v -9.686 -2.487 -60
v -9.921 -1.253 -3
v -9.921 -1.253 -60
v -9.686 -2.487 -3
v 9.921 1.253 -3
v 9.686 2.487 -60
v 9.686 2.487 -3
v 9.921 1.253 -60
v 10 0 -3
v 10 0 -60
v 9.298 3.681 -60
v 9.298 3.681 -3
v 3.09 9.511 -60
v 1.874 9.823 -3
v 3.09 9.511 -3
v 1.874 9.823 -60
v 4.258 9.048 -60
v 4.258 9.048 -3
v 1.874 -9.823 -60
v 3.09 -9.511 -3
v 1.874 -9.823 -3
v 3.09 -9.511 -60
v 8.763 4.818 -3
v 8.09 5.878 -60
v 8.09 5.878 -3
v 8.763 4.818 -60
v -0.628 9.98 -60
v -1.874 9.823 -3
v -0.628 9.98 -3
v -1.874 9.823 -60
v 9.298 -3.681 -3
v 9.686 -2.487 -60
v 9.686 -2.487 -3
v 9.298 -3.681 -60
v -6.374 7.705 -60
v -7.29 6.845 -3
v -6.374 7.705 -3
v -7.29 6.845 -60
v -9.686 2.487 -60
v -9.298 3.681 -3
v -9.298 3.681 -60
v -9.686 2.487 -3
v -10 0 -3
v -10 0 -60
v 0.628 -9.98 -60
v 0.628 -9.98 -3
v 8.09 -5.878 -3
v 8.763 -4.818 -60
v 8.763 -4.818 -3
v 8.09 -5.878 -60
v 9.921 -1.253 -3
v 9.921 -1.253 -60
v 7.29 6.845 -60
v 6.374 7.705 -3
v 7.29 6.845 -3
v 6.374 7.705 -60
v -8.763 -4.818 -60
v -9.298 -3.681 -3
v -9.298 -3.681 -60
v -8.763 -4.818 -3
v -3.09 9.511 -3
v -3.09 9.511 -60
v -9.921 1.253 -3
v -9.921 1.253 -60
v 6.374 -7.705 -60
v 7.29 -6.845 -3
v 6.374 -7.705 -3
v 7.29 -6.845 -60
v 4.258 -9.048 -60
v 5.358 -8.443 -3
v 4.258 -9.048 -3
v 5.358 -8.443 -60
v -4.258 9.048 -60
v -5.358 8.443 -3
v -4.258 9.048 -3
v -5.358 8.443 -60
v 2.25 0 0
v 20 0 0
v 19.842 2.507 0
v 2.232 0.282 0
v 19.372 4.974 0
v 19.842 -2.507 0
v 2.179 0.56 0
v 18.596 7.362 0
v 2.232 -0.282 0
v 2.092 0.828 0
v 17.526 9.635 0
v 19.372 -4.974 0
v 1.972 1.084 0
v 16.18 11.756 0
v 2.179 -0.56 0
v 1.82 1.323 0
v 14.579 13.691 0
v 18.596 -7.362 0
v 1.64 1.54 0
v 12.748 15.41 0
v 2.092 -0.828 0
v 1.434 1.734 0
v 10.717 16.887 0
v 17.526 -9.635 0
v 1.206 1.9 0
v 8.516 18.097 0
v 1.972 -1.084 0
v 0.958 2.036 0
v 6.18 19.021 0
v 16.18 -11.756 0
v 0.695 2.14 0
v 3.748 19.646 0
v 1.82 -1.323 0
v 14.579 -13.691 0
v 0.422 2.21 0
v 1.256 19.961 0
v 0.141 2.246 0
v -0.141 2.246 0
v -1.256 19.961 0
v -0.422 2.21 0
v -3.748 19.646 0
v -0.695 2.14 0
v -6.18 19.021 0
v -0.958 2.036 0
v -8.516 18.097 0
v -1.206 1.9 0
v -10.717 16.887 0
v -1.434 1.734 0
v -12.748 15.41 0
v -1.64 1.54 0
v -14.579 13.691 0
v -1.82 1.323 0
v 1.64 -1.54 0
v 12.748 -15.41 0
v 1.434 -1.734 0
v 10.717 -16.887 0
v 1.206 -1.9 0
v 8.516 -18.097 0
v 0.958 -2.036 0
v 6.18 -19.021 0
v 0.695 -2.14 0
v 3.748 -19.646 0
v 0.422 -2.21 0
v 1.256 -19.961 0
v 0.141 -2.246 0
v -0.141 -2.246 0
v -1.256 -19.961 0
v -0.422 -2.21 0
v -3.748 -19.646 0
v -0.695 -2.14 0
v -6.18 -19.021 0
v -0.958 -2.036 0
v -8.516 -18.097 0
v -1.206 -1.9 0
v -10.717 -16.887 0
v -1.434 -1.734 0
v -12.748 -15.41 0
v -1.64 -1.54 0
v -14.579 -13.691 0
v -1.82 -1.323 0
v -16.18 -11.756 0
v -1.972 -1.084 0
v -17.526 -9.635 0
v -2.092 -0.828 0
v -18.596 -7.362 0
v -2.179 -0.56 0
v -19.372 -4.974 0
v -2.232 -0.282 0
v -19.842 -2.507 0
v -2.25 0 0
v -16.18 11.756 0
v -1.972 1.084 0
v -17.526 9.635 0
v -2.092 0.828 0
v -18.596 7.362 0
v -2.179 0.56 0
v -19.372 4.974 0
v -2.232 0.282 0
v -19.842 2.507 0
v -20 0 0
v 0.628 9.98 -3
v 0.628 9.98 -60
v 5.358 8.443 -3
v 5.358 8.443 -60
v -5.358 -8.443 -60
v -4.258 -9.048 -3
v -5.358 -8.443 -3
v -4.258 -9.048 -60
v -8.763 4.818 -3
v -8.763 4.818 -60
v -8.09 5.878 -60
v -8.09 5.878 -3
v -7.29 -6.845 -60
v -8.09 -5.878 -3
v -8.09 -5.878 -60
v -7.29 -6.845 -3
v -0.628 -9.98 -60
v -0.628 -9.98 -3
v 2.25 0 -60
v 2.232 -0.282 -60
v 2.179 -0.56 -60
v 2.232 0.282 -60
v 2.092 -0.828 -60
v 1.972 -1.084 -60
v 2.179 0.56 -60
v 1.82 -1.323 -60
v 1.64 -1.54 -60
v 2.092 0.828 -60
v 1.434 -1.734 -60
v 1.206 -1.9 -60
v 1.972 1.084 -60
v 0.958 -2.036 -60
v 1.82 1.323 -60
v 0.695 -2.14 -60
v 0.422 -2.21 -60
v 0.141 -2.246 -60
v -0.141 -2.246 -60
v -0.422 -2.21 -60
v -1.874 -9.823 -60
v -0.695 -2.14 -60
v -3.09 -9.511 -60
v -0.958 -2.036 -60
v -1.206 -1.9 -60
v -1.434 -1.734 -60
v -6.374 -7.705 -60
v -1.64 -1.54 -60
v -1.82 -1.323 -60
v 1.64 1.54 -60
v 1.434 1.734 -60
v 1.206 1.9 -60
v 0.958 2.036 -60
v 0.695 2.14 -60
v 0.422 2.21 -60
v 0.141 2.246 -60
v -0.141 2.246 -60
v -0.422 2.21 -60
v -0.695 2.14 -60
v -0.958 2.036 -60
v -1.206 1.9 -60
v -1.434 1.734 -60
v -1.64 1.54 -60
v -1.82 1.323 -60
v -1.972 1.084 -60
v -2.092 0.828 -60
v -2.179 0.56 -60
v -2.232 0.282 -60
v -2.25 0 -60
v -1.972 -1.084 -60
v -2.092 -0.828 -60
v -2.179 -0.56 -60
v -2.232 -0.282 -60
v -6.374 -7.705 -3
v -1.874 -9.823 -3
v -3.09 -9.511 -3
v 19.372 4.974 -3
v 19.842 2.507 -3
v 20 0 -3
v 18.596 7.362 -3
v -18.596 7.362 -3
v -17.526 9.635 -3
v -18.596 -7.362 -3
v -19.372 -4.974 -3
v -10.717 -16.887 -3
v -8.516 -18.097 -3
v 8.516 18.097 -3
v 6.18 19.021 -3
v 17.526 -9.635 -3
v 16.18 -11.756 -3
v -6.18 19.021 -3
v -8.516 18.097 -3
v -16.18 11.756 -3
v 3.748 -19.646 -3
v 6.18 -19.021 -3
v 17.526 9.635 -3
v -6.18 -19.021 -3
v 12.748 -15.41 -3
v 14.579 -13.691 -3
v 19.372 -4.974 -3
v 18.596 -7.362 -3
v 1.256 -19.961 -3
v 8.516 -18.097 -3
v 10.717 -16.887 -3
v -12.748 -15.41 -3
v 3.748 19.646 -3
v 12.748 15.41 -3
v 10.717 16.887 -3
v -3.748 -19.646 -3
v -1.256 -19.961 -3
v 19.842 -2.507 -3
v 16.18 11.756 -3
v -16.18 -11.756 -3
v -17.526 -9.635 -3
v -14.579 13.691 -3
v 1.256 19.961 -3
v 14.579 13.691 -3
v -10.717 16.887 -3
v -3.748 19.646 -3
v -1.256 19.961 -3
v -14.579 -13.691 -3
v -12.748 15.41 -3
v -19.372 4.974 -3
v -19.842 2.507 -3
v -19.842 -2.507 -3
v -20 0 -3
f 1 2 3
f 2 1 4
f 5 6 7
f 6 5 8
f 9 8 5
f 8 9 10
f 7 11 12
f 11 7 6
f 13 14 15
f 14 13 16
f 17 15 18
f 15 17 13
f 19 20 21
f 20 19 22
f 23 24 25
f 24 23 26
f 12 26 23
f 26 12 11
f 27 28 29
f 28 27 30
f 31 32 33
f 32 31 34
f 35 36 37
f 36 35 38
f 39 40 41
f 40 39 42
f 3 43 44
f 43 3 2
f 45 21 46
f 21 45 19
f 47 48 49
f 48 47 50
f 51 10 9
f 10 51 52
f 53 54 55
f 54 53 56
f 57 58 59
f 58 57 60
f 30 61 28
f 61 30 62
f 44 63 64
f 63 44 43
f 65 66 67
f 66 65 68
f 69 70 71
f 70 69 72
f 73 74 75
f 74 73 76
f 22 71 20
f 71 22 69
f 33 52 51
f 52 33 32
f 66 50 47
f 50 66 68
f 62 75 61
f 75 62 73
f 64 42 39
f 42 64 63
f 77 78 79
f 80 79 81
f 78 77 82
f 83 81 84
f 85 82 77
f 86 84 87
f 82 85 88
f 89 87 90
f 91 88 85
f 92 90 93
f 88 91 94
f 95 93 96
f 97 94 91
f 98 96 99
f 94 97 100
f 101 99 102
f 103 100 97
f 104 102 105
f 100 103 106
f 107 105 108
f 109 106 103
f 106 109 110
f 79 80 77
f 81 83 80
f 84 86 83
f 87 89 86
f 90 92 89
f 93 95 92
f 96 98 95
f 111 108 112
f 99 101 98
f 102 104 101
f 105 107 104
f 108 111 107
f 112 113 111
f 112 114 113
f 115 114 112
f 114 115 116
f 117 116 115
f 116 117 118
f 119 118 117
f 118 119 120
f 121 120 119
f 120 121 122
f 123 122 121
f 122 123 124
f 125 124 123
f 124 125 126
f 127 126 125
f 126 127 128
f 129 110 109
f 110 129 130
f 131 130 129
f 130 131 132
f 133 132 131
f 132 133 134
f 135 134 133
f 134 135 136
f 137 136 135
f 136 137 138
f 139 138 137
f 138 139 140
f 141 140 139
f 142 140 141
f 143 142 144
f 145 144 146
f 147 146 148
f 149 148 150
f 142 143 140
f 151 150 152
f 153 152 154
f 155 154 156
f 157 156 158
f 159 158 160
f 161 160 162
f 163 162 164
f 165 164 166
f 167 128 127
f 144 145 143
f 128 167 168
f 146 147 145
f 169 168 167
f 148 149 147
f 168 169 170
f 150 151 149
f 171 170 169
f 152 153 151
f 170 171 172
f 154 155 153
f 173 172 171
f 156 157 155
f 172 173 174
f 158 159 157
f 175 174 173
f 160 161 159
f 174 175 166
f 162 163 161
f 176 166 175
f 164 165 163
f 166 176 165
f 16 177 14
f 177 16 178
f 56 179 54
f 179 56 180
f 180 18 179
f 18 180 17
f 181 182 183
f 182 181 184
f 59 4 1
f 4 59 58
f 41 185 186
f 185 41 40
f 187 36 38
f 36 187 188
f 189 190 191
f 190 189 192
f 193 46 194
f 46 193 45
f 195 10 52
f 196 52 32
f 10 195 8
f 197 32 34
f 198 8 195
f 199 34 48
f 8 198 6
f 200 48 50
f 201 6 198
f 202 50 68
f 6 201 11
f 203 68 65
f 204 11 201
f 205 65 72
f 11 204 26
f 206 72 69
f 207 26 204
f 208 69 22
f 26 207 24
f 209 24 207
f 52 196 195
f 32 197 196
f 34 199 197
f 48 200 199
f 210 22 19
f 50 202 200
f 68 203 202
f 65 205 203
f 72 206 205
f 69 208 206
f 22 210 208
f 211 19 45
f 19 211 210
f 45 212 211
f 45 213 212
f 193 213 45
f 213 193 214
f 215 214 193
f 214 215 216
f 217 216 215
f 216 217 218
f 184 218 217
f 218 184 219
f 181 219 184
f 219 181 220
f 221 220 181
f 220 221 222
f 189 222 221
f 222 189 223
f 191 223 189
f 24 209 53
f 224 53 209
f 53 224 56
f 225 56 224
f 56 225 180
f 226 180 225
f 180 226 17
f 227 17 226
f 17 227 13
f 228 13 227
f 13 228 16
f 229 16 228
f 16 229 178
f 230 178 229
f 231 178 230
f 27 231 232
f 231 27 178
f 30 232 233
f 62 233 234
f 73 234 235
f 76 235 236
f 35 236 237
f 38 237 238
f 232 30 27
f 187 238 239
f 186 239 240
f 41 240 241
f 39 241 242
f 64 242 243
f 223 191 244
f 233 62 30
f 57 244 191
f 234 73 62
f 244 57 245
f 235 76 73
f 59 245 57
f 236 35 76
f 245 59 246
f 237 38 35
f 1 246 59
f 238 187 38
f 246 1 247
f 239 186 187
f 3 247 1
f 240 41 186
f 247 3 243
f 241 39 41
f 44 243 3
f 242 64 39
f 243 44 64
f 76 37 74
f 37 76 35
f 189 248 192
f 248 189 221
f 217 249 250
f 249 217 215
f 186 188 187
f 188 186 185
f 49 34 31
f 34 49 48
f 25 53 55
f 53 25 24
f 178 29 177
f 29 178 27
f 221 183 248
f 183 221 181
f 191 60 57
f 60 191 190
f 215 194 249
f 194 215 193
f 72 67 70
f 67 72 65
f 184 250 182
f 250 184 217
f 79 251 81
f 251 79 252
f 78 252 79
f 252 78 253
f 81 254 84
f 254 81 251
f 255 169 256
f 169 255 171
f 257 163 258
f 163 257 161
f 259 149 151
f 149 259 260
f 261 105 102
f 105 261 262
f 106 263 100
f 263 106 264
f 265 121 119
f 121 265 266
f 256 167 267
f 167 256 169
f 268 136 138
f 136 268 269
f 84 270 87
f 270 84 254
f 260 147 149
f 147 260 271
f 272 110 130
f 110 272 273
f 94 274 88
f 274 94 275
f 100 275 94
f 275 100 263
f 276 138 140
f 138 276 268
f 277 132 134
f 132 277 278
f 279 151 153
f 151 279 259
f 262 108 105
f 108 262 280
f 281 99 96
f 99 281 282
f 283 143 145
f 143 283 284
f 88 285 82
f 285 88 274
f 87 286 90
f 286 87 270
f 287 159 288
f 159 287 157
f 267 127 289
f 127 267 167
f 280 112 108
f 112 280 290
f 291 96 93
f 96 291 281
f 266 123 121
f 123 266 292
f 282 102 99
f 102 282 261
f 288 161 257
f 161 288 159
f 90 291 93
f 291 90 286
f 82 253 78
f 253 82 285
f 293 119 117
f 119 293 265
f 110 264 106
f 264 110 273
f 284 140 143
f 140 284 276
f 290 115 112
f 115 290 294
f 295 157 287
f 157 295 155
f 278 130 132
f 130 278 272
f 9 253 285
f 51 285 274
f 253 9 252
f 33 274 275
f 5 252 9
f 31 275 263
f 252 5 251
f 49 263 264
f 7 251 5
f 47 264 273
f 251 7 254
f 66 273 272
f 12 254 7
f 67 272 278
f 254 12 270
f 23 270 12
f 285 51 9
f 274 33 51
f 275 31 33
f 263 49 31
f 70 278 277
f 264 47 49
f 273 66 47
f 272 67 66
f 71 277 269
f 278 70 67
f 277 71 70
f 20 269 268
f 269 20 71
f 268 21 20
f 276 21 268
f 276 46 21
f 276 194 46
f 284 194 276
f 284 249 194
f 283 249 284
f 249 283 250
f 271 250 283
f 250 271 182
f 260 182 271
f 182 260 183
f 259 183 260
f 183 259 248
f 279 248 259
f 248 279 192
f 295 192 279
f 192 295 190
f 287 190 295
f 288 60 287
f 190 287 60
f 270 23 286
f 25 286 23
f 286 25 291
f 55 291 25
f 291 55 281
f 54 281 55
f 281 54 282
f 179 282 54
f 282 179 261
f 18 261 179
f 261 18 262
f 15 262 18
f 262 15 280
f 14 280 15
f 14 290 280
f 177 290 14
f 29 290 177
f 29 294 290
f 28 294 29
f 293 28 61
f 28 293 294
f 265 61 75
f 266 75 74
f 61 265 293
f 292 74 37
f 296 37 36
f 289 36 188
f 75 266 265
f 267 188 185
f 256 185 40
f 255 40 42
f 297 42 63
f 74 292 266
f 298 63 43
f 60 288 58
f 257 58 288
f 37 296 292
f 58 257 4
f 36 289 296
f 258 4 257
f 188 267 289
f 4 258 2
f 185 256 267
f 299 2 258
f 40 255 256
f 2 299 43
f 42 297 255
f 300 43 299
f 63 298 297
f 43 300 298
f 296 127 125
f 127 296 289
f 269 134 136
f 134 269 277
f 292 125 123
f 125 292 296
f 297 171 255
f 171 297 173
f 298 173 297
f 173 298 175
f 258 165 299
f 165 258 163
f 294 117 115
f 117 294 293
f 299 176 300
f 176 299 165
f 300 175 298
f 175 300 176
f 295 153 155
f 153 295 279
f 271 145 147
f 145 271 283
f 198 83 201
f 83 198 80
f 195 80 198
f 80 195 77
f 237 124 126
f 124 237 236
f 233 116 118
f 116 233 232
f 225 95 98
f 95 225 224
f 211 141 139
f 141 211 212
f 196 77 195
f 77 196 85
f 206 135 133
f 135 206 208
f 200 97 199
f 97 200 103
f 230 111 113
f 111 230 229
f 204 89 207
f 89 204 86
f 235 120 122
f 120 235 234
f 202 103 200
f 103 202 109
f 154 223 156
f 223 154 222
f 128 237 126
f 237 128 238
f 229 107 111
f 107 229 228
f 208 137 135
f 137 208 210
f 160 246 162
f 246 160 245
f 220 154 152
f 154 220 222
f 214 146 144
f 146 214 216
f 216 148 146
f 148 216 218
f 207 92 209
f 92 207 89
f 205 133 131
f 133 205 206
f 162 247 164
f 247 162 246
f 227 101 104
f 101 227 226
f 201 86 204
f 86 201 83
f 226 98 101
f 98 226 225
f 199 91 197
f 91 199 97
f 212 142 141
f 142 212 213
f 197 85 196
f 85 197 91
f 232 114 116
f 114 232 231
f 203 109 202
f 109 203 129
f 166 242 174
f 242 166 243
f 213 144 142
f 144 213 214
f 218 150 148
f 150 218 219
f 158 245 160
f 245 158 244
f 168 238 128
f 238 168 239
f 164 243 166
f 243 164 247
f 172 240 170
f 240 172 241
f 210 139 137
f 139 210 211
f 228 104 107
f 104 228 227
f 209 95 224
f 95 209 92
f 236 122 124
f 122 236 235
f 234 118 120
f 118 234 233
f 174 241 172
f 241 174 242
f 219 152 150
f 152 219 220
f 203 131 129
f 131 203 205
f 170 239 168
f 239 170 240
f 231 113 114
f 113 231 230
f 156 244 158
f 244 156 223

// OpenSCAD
$fn = 50;


difference() {
	union() {
		translate(v = [0, 0, -60.0000000000]) {
			cylinder(h = 60, r = 10.0000000000);
		}
		translate(v = [0, 0, -3.0000000000]) {
			cylinder(h = 3, r = 20.0000000000);
		}
	}
	union() {
		#translate(v = [0, 0, -60]) {
			cylinder(h = 60, r = 2.2500000000);
		}
	}
}
